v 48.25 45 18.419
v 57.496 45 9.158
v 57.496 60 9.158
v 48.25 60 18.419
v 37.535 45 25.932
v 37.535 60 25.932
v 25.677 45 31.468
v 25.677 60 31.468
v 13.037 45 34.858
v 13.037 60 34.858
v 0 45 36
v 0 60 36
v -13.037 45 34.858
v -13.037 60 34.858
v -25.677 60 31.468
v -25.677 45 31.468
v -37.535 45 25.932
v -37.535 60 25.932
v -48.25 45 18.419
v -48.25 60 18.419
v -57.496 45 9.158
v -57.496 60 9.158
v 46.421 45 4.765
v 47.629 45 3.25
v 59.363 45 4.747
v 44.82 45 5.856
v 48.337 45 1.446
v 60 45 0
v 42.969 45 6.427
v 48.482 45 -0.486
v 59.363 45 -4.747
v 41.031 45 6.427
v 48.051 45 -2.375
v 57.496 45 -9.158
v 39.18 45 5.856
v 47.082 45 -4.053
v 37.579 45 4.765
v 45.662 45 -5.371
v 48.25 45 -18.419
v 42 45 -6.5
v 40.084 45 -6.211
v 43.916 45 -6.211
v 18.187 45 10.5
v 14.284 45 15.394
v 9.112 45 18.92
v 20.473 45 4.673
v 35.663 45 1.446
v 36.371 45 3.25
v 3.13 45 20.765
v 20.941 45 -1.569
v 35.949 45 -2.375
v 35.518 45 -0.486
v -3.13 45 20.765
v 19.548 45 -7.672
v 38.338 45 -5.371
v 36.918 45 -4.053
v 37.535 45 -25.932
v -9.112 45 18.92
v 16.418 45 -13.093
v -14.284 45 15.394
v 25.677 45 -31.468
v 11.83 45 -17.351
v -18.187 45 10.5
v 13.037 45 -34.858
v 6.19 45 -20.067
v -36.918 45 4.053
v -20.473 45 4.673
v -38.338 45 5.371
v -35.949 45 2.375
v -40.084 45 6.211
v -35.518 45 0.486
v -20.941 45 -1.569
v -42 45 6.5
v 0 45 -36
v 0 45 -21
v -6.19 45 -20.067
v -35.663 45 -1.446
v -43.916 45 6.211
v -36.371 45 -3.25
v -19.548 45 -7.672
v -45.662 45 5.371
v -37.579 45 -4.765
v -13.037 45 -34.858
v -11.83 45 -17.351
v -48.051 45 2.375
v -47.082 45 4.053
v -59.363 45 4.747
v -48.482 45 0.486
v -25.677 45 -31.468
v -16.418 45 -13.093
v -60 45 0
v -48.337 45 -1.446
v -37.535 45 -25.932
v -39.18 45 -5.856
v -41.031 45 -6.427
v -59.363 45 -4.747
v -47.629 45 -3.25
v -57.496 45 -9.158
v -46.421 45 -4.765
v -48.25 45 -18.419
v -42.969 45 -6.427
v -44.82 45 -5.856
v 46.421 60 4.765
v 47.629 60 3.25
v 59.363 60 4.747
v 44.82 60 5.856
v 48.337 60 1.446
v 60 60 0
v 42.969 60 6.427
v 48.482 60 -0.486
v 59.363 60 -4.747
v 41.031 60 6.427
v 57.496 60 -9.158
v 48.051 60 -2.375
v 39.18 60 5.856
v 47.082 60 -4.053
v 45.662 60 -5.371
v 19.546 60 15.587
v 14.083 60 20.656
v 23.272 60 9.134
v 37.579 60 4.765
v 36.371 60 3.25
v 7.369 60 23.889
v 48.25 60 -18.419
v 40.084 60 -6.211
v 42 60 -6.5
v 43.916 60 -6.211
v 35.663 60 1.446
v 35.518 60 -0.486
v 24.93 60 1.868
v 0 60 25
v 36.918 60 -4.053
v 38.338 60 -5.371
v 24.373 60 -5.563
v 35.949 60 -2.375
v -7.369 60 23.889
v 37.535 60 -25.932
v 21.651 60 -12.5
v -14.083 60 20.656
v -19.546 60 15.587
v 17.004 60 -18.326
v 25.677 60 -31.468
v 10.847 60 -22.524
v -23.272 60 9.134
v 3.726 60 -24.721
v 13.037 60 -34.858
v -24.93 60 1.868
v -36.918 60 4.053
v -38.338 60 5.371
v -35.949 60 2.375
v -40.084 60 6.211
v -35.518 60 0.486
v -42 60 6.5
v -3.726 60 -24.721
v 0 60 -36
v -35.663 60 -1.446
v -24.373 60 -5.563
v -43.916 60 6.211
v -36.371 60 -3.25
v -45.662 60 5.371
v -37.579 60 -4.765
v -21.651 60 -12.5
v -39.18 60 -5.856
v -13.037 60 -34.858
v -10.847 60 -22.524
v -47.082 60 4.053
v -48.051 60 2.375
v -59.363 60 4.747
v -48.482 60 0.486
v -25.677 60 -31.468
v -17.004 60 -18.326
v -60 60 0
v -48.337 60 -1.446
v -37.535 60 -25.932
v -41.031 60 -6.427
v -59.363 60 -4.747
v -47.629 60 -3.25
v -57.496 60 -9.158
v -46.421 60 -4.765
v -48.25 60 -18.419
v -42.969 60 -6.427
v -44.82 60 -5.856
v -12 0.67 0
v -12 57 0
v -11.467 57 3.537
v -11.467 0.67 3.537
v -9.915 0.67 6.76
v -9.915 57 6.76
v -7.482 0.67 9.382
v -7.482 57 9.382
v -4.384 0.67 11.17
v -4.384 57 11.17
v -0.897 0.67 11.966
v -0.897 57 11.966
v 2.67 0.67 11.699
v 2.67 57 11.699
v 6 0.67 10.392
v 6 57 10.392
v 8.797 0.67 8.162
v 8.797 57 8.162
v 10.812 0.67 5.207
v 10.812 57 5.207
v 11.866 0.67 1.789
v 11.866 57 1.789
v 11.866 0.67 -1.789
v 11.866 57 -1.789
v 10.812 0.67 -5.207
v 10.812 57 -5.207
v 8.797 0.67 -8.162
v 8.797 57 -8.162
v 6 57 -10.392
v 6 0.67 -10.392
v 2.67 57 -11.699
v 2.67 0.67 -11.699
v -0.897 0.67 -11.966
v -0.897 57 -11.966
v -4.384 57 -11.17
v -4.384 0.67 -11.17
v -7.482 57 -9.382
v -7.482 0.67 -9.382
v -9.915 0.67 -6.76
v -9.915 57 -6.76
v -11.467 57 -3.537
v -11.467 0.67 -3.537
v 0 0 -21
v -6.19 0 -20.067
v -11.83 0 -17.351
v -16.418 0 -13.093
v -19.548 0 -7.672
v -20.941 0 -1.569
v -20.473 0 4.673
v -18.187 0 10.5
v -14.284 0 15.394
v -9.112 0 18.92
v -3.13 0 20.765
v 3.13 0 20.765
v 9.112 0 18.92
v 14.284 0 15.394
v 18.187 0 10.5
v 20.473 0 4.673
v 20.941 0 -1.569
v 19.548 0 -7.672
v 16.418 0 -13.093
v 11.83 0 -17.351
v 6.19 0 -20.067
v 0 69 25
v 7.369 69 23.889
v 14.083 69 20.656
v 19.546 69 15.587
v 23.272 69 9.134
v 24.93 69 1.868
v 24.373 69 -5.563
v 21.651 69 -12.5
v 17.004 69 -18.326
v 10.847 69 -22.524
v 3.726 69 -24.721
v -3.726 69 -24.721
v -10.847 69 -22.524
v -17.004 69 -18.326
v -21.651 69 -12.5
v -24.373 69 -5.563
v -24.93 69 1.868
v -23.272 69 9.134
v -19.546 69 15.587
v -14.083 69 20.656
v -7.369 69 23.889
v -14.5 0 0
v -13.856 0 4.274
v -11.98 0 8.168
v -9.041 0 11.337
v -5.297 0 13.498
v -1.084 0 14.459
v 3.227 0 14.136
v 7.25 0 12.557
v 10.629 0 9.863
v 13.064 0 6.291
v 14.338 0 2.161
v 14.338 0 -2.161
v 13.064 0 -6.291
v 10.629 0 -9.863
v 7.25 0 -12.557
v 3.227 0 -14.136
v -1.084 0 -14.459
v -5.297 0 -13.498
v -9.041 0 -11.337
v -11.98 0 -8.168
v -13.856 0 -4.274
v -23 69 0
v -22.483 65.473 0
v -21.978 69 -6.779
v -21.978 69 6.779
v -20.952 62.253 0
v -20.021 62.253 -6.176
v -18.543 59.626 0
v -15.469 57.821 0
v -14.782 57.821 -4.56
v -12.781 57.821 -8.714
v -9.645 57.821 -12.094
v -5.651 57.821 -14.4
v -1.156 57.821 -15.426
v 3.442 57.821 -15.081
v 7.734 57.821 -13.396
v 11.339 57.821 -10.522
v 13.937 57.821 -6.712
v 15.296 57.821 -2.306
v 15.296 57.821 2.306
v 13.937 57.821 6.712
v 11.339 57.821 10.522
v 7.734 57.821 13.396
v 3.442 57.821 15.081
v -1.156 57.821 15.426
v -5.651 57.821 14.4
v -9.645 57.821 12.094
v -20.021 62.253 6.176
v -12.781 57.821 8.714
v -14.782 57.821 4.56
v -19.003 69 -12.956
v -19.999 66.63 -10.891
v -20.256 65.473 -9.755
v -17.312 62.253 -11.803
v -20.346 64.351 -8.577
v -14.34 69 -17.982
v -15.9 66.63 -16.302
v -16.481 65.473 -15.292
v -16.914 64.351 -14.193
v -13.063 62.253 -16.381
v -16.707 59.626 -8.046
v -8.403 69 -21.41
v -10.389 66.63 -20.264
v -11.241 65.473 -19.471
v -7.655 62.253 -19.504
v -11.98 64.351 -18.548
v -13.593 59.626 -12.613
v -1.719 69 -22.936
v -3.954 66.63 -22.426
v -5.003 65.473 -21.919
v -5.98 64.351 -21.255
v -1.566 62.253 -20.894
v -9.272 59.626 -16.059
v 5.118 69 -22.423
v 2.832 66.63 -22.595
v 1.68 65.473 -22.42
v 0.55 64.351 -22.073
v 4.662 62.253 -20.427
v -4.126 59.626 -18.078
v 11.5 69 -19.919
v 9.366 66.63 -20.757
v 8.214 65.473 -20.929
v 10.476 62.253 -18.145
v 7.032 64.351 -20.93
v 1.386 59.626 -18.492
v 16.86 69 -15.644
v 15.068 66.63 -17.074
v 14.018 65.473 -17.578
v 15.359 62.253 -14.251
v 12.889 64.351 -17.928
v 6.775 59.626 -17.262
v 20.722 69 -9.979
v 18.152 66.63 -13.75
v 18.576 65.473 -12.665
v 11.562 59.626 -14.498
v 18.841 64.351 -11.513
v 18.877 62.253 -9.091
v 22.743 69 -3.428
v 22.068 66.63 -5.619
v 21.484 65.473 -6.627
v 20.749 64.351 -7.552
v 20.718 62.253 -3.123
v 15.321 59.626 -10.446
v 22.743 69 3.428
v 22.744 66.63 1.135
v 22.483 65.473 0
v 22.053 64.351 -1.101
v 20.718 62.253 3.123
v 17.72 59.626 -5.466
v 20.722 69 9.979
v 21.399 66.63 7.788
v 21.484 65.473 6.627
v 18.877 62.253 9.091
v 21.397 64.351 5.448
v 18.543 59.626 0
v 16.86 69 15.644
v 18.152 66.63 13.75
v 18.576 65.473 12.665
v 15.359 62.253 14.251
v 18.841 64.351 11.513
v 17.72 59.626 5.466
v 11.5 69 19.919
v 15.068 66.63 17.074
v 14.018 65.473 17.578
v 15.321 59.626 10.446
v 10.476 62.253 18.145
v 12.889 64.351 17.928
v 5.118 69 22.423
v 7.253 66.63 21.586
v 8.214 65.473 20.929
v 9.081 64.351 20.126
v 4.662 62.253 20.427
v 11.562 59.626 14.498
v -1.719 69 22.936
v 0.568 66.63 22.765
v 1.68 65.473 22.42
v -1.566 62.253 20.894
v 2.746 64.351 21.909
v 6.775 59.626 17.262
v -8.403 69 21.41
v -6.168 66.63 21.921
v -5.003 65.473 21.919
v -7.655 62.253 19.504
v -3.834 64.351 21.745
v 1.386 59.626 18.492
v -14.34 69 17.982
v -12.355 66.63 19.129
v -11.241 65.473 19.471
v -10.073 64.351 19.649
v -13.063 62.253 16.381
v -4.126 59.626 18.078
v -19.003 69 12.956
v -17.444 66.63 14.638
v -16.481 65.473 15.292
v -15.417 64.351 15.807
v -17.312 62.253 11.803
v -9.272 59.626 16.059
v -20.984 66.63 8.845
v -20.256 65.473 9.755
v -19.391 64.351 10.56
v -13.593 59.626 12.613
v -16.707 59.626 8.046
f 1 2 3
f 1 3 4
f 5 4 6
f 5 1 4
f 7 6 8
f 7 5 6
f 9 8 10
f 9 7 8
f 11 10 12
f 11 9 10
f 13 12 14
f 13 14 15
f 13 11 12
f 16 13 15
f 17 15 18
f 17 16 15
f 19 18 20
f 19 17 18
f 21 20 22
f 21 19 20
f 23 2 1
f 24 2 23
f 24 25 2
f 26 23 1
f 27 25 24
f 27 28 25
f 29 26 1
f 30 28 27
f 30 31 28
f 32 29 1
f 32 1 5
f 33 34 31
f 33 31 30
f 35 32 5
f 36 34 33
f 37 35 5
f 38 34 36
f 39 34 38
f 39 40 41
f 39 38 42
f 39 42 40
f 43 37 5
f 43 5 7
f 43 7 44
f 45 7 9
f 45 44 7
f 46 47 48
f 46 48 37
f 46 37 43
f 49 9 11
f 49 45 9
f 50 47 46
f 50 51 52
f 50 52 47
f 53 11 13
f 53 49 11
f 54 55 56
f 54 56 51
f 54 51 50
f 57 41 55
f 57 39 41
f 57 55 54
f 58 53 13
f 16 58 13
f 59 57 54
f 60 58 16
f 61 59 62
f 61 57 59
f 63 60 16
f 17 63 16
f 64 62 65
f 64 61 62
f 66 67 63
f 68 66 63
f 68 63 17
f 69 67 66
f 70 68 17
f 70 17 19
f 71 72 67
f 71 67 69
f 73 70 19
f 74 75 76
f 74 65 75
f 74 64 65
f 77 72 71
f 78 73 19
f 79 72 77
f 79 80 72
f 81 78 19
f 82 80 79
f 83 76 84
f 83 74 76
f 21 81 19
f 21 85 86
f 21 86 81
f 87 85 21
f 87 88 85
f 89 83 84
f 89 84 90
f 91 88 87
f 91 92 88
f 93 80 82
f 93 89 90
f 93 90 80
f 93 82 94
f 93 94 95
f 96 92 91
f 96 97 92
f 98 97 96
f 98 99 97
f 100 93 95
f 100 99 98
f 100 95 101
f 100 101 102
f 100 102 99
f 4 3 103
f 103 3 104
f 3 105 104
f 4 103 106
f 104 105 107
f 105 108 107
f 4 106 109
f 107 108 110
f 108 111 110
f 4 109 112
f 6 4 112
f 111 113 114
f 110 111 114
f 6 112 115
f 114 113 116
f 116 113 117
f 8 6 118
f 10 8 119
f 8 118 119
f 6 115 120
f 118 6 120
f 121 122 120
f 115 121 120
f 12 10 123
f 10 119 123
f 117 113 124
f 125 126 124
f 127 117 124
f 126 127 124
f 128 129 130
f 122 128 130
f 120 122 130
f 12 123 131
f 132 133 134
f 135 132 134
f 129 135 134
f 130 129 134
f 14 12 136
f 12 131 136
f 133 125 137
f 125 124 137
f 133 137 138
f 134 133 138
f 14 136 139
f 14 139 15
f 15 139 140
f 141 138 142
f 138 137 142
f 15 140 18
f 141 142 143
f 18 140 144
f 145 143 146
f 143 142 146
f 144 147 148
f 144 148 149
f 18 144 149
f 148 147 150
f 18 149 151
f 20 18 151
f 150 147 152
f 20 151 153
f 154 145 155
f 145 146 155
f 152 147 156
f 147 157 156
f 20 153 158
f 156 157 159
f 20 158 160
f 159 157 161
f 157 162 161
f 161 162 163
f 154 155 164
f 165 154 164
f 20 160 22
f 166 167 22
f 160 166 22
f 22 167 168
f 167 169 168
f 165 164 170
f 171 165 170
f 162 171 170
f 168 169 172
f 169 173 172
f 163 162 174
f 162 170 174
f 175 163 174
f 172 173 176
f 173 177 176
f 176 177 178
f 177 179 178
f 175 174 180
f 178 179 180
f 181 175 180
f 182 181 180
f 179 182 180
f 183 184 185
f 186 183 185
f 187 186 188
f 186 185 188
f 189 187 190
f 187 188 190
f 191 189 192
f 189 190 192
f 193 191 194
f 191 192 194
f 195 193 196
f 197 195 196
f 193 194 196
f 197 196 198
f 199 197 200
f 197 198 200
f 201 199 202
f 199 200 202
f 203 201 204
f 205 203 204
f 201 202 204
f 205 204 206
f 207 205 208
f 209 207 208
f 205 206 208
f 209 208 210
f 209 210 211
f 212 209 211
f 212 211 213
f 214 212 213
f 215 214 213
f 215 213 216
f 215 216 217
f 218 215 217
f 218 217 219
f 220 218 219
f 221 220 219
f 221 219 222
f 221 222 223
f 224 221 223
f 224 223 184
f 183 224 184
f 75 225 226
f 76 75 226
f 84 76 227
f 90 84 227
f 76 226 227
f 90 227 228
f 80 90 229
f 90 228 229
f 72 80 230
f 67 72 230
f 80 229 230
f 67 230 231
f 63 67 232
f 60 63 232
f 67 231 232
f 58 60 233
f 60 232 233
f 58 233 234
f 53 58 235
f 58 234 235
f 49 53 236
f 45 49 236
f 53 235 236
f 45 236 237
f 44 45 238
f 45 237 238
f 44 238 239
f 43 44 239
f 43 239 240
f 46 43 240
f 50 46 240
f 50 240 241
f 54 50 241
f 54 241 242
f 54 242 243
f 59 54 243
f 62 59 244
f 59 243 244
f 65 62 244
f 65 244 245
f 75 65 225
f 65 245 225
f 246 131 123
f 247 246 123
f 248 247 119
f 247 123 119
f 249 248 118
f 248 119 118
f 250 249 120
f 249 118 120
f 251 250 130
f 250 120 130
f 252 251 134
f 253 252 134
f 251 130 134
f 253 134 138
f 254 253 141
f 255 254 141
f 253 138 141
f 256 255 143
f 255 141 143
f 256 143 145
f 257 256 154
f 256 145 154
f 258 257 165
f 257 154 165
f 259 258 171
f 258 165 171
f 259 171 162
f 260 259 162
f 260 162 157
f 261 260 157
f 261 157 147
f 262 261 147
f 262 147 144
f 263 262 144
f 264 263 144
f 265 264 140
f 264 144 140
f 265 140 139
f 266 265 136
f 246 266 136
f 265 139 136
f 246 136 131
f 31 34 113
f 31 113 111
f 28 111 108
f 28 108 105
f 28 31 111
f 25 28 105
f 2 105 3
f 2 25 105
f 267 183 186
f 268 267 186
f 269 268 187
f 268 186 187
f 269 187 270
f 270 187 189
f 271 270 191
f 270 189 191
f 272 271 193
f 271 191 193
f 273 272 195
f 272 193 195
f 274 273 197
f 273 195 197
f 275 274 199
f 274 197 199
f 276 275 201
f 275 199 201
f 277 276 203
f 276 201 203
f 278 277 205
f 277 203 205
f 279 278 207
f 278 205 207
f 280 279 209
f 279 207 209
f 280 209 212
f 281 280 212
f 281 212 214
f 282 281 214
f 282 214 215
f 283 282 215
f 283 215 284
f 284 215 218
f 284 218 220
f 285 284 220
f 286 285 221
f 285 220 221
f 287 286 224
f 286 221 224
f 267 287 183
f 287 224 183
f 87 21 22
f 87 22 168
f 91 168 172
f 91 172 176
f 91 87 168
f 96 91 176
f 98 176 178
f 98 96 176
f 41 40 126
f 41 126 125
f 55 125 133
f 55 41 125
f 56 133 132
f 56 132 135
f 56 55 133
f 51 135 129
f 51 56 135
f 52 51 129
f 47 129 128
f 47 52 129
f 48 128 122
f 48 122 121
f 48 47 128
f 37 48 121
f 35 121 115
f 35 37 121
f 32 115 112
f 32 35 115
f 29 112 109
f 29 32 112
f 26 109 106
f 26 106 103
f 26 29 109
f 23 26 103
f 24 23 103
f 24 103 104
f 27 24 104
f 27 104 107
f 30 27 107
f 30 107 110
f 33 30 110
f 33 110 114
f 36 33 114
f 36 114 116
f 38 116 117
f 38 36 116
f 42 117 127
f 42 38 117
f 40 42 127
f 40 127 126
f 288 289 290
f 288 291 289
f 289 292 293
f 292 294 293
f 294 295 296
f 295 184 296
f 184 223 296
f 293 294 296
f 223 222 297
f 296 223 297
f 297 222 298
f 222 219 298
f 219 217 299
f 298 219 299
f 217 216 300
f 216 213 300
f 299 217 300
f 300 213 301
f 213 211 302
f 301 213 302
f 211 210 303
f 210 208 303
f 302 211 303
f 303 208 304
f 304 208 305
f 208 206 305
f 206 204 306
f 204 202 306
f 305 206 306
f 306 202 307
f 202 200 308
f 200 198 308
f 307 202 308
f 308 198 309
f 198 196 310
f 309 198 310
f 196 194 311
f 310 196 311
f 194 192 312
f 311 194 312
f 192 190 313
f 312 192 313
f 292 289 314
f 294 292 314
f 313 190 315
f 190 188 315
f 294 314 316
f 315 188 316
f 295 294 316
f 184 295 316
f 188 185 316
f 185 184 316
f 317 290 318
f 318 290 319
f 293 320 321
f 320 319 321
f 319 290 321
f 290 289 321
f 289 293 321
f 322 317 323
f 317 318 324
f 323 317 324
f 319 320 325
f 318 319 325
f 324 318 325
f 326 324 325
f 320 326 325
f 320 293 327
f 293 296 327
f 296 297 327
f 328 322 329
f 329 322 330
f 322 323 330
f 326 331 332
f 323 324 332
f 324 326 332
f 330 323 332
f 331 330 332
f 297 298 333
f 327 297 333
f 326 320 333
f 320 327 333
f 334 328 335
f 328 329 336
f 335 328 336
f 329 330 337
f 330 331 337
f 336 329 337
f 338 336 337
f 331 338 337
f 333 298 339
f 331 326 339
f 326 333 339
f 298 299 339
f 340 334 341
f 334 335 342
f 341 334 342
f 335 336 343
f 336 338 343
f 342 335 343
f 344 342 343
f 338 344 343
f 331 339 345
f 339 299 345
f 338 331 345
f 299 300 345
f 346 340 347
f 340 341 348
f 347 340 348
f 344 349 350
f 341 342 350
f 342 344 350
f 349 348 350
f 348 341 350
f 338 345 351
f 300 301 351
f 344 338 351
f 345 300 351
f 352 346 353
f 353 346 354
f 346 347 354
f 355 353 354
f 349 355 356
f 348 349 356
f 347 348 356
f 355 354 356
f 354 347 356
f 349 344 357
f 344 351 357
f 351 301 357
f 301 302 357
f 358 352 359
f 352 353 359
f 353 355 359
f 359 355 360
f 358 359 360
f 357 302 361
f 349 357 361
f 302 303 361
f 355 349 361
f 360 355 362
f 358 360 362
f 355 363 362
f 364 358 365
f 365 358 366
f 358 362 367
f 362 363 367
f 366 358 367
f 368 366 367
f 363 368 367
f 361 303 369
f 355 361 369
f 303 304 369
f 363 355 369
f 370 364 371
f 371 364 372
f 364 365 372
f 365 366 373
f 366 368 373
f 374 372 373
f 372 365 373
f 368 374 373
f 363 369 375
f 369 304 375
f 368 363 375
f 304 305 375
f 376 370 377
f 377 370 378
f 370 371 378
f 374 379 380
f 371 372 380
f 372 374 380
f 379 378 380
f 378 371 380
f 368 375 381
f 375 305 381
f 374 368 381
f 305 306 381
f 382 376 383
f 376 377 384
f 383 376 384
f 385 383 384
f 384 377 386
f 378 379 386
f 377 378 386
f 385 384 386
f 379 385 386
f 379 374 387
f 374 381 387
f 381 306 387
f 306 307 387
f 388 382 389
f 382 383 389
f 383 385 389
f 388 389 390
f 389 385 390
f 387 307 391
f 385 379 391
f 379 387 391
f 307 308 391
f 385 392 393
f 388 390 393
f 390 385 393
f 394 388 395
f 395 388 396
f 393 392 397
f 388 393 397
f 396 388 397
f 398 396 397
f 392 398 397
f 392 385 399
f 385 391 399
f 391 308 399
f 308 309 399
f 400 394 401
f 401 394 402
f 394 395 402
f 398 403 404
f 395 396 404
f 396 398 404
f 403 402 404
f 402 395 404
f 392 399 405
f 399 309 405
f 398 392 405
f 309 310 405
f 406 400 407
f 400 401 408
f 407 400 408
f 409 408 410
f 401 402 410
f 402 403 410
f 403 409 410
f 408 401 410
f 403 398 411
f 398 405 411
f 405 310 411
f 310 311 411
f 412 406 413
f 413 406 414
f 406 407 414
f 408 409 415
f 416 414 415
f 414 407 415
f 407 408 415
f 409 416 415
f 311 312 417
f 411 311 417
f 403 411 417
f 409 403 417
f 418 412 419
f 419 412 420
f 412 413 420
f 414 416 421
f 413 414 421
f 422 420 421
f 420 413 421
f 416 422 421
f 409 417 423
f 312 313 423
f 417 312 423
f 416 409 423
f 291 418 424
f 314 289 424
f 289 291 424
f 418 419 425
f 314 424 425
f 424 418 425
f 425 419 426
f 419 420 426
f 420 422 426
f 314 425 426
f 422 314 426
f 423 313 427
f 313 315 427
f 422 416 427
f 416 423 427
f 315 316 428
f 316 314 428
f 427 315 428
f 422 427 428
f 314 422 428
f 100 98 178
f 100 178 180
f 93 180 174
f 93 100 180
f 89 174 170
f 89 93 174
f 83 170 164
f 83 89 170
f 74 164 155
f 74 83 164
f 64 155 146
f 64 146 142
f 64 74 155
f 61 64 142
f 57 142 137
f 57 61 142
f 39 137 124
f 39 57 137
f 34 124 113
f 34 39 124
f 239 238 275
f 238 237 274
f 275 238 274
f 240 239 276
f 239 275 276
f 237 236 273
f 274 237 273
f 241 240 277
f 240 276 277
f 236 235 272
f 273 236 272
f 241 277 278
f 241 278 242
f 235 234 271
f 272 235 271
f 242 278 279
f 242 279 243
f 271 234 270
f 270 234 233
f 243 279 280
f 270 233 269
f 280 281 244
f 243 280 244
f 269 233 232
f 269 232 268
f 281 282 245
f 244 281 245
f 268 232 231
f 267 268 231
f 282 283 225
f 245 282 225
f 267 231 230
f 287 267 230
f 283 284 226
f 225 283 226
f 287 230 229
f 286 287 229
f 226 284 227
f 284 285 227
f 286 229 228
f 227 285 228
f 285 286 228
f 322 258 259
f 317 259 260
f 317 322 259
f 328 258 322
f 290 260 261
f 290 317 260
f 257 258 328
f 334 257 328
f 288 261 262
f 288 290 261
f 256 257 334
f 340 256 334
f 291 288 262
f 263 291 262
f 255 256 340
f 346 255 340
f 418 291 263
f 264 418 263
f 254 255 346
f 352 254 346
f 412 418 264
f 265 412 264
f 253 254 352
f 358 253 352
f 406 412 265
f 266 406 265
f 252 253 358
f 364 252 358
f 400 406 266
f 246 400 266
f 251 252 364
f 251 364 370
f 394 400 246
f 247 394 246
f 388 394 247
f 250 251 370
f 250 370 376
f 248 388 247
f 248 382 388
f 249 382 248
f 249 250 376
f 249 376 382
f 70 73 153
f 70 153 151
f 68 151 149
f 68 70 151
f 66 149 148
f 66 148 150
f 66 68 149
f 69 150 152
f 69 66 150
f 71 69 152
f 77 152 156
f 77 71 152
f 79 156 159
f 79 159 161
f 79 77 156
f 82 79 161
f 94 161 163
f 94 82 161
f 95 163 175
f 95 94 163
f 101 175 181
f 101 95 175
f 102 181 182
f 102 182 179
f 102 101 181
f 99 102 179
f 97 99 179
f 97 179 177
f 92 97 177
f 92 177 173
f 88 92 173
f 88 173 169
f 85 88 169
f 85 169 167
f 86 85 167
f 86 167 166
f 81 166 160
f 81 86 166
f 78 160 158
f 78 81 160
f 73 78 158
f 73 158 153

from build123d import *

# Parameters (mm, degrees)
SKETCH1_R           = 21
BOSS_EXTRUDE1_DEPTH = 45
SKETCH2_R           = 6.5
BOSS_EXTRUDE2_DEPTH = 15
SKETCH3_R           = 25
BOSS_EXTRUDE3_DEPTH = 9
CUT_EXTRUDE1_REACH  = 92.25
SKETCH5_R           = 12
CHAMFER1_SIZE       = 2.5
CHAMFER1_SIZE2      = 0.669872981


with BuildPart() as part:
    # Sketch1 → Boss-Extrude1 (new body)
    with BuildSketch(Plane(origin=(0, 0, 0), x_dir=(1, 0, 0), z_dir=(0, 1, 0))):
        with Locations(Location((0, 0, 0), (0, 0, 90))):
            Circle(SKETCH1_R)
    extrude(amount=BOSS_EXTRUDE1_DEPTH)

    # Sketch2 → Boss-Extrude2 (add)
    with BuildSketch(Plane(origin=(0, 45, 0), x_dir=(1, 0, 0), z_dir=(0, 1, 0))):
        with BuildLine():
            ThreePointArc((-57.496195447, -9.157943365), (-60, 0), (-57.496195447, 9.157943365))
            ThreePointArc((-57.496195447, 9.157943365), (0, 36), (57.496195447, 9.157943365))
            ThreePointArc((57.496195447, 9.157943365), (60, 0), (57.496195447, -9.157943365))
            ThreePointArc((57.496195447, -9.157943365), (0, -36), (-57.496195447, -9.157943365))
        make_face()
        with Locations(Location((-42, 0, 0), (0, 0, 270))):
            Circle(SKETCH2_R, mode=Mode.SUBTRACT)
        with Locations(Location((42, 0, 0), (0, 0, 90))):
            Circle(SKETCH2_R, mode=Mode.SUBTRACT)
    extrude(amount=BOSS_EXTRUDE2_DEPTH)

    # Sketch3 → Boss-Extrude3 (add)
    with BuildSketch(Plane(origin=(0, 60, 0), x_dir=(1, 0, 0), z_dir=(0, 1, 0))):
        with Locations(Location((0, 0, 0), (0, 0, 270))):
            Circle(SKETCH3_R)
    extrude(amount=BOSS_EXTRUDE3_DEPTH)

    # Sketch4 → Cut-Revolve1 (revolve, cut)
    with BuildSketch(Plane.XY):
        with BuildLine():
            Line((-12, 57), (0, 57))
            Line((0, 57), (0, 69))
            Line((0, 69), (-23, 69))
            ThreePointArc((-23, 69), (-19.845922252, 60.849571269), (-12, 57))
        make_face()
    revolve(axis=Axis((0, 69, 0), (0, -1, 0)), mode=Mode.SUBTRACT)

    # Sketch5 → Cut-Extrude1 (cut, up to next)
    with BuildSketch(Plane(origin=(0, 57, 0), x_dir=(1, 0, 0), z_dir=(0, 1, 0)), mode=Mode.PRIVATE) as cut_extrude1_sk1:
        with Locations(Location((0, 0, 0), (0, 0, 180))):
            Circle(SKETCH5_R)
    cut_extrude1_tool1 = extrude(cut_extrude1_sk1.sketch, amount=-CUT_EXTRUDE1_REACH, mode=Mode.PRIVATE) & part.part
    add(cut_extrude1_tool1.solids().sort_by_distance((0, 57, 0))[0], mode=Mode.SUBTRACT)

    # Chamfer1
    chamfer1_edges = [part.edges().sort_by_distance(p)[0] for p in [
        (12, 0, 0),
    ]]
    chamfer1_side = [part.faces().sort_by_distance(p)[0] for p in [
        (0, 0, 20.406030304),
    ]]
    chamfer(chamfer1_edges, length=CHAMFER1_SIZE, length2=CHAMFER1_SIZE2, reference=chamfer1_side[0])


solid = part.part
